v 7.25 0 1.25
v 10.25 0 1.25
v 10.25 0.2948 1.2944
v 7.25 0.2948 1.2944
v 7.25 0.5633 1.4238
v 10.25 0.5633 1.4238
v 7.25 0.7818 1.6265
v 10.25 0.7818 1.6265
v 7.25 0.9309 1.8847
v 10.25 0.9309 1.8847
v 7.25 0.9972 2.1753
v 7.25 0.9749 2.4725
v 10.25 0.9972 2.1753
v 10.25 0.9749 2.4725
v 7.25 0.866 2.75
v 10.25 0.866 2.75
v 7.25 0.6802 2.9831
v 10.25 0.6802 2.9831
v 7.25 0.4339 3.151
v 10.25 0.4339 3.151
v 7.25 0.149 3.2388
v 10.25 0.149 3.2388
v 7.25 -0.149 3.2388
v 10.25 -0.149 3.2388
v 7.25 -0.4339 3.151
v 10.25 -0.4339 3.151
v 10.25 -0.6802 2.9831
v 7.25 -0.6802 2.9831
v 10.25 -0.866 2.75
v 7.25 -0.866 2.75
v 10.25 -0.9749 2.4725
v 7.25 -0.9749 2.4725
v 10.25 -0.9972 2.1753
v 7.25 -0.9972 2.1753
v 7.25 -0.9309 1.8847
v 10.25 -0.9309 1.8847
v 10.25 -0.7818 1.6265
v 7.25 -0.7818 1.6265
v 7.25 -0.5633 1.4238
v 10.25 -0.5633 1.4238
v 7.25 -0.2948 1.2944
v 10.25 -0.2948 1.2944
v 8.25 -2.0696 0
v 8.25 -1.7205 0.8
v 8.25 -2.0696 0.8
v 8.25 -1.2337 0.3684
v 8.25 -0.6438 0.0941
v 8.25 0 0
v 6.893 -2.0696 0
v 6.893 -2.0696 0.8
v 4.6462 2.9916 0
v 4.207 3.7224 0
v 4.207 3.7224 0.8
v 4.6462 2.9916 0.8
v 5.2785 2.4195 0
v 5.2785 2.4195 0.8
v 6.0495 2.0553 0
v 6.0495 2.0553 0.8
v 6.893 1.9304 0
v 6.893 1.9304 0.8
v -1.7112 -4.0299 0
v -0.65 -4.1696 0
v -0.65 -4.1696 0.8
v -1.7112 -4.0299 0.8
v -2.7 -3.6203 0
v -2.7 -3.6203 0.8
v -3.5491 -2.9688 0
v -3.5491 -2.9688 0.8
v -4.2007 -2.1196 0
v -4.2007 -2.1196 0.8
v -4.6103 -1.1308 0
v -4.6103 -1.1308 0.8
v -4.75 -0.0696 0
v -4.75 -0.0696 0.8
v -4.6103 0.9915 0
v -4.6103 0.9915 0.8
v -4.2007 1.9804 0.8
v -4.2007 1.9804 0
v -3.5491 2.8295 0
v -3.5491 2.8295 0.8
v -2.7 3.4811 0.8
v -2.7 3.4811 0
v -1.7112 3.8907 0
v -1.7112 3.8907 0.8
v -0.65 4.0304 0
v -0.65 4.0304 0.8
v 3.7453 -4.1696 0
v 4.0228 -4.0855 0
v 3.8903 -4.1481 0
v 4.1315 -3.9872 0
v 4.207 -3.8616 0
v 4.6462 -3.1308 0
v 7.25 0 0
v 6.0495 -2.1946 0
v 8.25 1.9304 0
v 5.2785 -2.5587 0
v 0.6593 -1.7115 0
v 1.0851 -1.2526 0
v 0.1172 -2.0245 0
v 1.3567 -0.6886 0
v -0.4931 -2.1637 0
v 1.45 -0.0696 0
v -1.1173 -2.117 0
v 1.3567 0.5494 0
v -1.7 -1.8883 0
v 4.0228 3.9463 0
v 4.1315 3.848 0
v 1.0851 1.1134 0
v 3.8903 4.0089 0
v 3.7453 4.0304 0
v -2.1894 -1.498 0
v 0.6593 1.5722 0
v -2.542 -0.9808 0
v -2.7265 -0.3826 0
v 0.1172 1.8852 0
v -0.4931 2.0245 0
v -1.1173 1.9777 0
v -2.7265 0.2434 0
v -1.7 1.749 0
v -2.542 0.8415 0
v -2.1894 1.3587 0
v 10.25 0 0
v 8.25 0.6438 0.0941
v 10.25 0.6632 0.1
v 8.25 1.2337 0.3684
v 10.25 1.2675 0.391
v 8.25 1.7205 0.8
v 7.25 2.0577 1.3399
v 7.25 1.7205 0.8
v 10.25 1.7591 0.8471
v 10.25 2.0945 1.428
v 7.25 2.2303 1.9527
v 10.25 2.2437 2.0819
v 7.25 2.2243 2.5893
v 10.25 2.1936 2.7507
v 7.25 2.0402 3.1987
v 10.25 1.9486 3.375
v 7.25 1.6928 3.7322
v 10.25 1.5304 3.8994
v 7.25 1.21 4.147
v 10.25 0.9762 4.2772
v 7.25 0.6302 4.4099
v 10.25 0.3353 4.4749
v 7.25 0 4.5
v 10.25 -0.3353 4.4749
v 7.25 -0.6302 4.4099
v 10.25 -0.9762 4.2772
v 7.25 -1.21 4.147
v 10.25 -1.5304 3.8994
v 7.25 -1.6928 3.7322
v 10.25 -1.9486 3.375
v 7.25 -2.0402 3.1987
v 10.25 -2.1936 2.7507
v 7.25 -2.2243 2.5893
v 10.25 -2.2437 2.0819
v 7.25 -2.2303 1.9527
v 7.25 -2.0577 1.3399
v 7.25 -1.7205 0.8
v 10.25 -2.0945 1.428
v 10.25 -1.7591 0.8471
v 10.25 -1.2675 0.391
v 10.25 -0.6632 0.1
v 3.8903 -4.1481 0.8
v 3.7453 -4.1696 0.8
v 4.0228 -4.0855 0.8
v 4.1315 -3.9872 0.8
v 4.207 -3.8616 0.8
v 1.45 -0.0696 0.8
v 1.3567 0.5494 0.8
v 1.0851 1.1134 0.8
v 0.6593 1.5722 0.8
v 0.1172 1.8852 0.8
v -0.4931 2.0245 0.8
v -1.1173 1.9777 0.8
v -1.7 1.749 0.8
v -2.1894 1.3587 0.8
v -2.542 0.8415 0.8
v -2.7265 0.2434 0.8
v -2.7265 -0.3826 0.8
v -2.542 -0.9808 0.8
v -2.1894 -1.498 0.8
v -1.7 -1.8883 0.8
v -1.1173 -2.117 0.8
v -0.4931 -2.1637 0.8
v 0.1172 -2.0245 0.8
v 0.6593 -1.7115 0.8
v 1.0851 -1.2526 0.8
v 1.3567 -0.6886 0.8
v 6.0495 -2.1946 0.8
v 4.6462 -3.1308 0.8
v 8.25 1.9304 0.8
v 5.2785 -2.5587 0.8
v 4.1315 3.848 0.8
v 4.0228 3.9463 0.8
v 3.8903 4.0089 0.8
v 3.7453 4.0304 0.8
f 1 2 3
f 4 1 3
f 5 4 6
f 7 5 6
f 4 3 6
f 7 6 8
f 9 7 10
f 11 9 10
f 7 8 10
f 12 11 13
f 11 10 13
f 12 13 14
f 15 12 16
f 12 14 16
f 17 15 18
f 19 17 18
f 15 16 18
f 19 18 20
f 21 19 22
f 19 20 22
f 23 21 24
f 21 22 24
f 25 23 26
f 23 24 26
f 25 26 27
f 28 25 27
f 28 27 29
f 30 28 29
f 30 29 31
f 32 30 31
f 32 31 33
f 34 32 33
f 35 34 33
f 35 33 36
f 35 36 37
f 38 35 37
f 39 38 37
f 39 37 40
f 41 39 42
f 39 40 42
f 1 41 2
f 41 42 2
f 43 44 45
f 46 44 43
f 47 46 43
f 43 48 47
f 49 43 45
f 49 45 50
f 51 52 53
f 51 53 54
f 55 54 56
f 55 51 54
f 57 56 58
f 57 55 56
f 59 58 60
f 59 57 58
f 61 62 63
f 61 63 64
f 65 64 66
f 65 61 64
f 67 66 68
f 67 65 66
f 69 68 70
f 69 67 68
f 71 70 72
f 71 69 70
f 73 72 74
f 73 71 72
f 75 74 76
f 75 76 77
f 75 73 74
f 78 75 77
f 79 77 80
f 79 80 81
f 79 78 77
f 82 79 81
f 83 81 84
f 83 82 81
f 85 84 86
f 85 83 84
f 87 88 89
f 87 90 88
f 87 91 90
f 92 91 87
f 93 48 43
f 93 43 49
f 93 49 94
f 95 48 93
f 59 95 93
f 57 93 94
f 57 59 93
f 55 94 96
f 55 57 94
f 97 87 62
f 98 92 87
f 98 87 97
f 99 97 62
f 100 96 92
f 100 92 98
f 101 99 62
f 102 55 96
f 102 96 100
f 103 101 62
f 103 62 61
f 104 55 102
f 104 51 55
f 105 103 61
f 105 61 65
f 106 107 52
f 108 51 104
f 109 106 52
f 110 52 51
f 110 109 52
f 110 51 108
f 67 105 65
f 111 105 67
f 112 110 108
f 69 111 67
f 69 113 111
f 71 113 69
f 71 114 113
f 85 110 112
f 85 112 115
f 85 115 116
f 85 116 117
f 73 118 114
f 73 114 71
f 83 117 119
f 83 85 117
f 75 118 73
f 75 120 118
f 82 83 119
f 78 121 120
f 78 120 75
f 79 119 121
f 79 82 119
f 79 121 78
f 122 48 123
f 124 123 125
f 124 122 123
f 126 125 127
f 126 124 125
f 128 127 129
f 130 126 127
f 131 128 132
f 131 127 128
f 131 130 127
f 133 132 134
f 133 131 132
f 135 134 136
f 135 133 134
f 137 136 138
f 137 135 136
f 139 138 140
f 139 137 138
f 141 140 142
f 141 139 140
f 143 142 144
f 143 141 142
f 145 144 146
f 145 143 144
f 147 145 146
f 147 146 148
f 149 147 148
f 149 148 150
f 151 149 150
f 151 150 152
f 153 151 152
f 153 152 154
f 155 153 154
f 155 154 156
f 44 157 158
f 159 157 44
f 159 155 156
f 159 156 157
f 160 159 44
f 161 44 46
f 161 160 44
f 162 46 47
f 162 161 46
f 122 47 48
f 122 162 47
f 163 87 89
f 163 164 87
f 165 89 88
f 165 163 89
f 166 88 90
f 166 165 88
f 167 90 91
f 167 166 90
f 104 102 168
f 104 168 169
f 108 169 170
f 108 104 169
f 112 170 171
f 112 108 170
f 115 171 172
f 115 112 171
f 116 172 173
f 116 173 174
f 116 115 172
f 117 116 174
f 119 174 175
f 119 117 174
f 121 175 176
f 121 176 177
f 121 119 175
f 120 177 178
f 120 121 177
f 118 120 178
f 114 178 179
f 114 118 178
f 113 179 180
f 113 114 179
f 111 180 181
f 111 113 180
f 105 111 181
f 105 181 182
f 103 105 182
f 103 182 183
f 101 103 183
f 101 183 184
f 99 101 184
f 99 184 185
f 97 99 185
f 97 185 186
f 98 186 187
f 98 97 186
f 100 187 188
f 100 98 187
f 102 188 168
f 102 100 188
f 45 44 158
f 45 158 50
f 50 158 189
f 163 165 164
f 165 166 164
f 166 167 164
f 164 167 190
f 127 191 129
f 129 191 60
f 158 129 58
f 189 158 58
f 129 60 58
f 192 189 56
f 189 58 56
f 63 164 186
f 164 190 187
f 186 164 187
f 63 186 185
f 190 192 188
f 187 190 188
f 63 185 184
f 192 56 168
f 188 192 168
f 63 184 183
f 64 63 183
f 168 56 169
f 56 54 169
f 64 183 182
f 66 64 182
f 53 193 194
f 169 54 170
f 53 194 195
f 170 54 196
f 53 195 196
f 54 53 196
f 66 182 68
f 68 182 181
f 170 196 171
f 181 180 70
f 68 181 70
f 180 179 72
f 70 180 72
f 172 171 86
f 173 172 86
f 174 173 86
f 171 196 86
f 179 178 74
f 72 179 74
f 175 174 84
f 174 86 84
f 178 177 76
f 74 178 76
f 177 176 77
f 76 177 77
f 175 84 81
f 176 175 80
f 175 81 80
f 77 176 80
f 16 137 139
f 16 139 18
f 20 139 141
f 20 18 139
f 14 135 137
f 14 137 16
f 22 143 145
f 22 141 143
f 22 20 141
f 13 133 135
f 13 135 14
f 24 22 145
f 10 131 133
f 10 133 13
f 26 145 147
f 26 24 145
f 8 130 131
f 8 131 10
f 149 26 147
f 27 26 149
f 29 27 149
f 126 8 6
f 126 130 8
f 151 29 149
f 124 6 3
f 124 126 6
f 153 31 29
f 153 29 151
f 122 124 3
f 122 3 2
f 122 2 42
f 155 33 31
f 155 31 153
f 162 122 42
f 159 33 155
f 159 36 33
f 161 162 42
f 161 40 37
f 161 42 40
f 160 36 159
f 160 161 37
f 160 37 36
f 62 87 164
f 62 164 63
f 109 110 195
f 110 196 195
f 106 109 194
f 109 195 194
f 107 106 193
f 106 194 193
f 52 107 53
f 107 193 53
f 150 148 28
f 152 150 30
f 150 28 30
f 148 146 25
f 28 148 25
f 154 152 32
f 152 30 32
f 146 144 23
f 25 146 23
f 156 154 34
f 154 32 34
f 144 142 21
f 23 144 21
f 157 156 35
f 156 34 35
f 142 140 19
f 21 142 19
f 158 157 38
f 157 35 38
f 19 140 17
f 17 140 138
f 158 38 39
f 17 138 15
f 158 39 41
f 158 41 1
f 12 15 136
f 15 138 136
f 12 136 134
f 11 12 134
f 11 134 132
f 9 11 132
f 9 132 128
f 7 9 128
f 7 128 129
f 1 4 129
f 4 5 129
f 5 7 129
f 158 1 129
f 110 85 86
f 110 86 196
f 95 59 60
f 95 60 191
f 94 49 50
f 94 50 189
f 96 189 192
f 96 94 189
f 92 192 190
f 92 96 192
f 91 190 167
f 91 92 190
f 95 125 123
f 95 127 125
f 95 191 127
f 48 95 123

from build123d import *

# Parameters (mm, degrees)
SKETCH_1_R          = 2.1
EXTRUDE_4_DEPTH     = 0.8
SKETCH_2_R          = 2.25
SKETCH_2_R_2        = 1
EXTRUDE_5_DEPTH     = 3
FILLET_1_R          = 0.5
SKETCH_3_W          = 6.892182162
SKETCH_3_H          = 5.392211784
SKETCH_3_R          = 2.25
CUT_EXTRUDE_1_DEPTH = 2


with BuildPart() as part:
    # Эскиз1 → Вытянуть4 (new body)
    with BuildSketch(Plane.XY):
        with BuildLine():
            Line((-0.65, 4.030380872), (4.098720888, 4.030380872))
            ThreePointArc((4.098720888, 4.030380872), (5.145271439, 2.513906235), (6.892973224, 1.930380872))
            Line((6.892973224, 1.930380872), (10.25, 1.930380872))
            Line((10.25, 1.930380872), (10.25, 0.180380872))
            Line((10.25, 0.180380872), (10.25, -2.069619128))
            Line((10.25, -2.069619128), (6.892973224, -2.069619128))
            ThreePointArc((6.892973224, -2.069619128), (5.145271439, -2.653144492), (4.098720888, -4.169619128))
            Line((4.098720888, -4.169619128), (-0.65, -4.169619128))
            ThreePointArc((-0.65, -4.169619128), (-4.75, -0.069619128), (-0.65, 4.030380872))
        make_face()
        with Locations((-0.65, -0.069619128)):
            Circle(SKETCH_1_R, mode=Mode.SUBTRACT)
    extrude(amount=EXTRUDE_4_DEPTH)

    # Эскиз2 → Вытянуть5 (add)
    with BuildSketch(Plane(origin=(10.25, 0, 0), x_dir=(0, 0, -1), z_dir=(1, 0, 0))):
        with Locations((-2.25, 0)):
            Circle(SKETCH_2_R)
        with Locations((-2.25, 0)):
            Circle(SKETCH_2_R_2, mode=Mode.SUBTRACT)
    extrude(amount=-EXTRUDE_5_DEPTH)

    # Скругление1
    fillet_1_edges = [part.edges().sort_by_distance(p)[0] for p in [
        (4.098720888, -4.169619128, 0.4),
        (4.098720888, 4.030380872, 0.4),
    ]]
    fillet(fillet_1_edges, radius=FILLET_1_R)

    # Эскиз3 → Вырез-Вытянуть1 (cut)
    with BuildSketch(Plane(origin=(10.25, 0, 0), x_dir=(0, 0, -1), z_dir=(1, 0, 0))):
        with Locations((-2.090078371, -0.255202745)):
            Rectangle(SKETCH_3_W, SKETCH_3_H)
        with Locations((-2.25, 0)):
            Circle(SKETCH_3_R, mode=Mode.SUBTRACT)
    extrude(amount=-CUT_EXTRUDE_1_DEPTH, mode=Mode.SUBTRACT)


solid = part.part
